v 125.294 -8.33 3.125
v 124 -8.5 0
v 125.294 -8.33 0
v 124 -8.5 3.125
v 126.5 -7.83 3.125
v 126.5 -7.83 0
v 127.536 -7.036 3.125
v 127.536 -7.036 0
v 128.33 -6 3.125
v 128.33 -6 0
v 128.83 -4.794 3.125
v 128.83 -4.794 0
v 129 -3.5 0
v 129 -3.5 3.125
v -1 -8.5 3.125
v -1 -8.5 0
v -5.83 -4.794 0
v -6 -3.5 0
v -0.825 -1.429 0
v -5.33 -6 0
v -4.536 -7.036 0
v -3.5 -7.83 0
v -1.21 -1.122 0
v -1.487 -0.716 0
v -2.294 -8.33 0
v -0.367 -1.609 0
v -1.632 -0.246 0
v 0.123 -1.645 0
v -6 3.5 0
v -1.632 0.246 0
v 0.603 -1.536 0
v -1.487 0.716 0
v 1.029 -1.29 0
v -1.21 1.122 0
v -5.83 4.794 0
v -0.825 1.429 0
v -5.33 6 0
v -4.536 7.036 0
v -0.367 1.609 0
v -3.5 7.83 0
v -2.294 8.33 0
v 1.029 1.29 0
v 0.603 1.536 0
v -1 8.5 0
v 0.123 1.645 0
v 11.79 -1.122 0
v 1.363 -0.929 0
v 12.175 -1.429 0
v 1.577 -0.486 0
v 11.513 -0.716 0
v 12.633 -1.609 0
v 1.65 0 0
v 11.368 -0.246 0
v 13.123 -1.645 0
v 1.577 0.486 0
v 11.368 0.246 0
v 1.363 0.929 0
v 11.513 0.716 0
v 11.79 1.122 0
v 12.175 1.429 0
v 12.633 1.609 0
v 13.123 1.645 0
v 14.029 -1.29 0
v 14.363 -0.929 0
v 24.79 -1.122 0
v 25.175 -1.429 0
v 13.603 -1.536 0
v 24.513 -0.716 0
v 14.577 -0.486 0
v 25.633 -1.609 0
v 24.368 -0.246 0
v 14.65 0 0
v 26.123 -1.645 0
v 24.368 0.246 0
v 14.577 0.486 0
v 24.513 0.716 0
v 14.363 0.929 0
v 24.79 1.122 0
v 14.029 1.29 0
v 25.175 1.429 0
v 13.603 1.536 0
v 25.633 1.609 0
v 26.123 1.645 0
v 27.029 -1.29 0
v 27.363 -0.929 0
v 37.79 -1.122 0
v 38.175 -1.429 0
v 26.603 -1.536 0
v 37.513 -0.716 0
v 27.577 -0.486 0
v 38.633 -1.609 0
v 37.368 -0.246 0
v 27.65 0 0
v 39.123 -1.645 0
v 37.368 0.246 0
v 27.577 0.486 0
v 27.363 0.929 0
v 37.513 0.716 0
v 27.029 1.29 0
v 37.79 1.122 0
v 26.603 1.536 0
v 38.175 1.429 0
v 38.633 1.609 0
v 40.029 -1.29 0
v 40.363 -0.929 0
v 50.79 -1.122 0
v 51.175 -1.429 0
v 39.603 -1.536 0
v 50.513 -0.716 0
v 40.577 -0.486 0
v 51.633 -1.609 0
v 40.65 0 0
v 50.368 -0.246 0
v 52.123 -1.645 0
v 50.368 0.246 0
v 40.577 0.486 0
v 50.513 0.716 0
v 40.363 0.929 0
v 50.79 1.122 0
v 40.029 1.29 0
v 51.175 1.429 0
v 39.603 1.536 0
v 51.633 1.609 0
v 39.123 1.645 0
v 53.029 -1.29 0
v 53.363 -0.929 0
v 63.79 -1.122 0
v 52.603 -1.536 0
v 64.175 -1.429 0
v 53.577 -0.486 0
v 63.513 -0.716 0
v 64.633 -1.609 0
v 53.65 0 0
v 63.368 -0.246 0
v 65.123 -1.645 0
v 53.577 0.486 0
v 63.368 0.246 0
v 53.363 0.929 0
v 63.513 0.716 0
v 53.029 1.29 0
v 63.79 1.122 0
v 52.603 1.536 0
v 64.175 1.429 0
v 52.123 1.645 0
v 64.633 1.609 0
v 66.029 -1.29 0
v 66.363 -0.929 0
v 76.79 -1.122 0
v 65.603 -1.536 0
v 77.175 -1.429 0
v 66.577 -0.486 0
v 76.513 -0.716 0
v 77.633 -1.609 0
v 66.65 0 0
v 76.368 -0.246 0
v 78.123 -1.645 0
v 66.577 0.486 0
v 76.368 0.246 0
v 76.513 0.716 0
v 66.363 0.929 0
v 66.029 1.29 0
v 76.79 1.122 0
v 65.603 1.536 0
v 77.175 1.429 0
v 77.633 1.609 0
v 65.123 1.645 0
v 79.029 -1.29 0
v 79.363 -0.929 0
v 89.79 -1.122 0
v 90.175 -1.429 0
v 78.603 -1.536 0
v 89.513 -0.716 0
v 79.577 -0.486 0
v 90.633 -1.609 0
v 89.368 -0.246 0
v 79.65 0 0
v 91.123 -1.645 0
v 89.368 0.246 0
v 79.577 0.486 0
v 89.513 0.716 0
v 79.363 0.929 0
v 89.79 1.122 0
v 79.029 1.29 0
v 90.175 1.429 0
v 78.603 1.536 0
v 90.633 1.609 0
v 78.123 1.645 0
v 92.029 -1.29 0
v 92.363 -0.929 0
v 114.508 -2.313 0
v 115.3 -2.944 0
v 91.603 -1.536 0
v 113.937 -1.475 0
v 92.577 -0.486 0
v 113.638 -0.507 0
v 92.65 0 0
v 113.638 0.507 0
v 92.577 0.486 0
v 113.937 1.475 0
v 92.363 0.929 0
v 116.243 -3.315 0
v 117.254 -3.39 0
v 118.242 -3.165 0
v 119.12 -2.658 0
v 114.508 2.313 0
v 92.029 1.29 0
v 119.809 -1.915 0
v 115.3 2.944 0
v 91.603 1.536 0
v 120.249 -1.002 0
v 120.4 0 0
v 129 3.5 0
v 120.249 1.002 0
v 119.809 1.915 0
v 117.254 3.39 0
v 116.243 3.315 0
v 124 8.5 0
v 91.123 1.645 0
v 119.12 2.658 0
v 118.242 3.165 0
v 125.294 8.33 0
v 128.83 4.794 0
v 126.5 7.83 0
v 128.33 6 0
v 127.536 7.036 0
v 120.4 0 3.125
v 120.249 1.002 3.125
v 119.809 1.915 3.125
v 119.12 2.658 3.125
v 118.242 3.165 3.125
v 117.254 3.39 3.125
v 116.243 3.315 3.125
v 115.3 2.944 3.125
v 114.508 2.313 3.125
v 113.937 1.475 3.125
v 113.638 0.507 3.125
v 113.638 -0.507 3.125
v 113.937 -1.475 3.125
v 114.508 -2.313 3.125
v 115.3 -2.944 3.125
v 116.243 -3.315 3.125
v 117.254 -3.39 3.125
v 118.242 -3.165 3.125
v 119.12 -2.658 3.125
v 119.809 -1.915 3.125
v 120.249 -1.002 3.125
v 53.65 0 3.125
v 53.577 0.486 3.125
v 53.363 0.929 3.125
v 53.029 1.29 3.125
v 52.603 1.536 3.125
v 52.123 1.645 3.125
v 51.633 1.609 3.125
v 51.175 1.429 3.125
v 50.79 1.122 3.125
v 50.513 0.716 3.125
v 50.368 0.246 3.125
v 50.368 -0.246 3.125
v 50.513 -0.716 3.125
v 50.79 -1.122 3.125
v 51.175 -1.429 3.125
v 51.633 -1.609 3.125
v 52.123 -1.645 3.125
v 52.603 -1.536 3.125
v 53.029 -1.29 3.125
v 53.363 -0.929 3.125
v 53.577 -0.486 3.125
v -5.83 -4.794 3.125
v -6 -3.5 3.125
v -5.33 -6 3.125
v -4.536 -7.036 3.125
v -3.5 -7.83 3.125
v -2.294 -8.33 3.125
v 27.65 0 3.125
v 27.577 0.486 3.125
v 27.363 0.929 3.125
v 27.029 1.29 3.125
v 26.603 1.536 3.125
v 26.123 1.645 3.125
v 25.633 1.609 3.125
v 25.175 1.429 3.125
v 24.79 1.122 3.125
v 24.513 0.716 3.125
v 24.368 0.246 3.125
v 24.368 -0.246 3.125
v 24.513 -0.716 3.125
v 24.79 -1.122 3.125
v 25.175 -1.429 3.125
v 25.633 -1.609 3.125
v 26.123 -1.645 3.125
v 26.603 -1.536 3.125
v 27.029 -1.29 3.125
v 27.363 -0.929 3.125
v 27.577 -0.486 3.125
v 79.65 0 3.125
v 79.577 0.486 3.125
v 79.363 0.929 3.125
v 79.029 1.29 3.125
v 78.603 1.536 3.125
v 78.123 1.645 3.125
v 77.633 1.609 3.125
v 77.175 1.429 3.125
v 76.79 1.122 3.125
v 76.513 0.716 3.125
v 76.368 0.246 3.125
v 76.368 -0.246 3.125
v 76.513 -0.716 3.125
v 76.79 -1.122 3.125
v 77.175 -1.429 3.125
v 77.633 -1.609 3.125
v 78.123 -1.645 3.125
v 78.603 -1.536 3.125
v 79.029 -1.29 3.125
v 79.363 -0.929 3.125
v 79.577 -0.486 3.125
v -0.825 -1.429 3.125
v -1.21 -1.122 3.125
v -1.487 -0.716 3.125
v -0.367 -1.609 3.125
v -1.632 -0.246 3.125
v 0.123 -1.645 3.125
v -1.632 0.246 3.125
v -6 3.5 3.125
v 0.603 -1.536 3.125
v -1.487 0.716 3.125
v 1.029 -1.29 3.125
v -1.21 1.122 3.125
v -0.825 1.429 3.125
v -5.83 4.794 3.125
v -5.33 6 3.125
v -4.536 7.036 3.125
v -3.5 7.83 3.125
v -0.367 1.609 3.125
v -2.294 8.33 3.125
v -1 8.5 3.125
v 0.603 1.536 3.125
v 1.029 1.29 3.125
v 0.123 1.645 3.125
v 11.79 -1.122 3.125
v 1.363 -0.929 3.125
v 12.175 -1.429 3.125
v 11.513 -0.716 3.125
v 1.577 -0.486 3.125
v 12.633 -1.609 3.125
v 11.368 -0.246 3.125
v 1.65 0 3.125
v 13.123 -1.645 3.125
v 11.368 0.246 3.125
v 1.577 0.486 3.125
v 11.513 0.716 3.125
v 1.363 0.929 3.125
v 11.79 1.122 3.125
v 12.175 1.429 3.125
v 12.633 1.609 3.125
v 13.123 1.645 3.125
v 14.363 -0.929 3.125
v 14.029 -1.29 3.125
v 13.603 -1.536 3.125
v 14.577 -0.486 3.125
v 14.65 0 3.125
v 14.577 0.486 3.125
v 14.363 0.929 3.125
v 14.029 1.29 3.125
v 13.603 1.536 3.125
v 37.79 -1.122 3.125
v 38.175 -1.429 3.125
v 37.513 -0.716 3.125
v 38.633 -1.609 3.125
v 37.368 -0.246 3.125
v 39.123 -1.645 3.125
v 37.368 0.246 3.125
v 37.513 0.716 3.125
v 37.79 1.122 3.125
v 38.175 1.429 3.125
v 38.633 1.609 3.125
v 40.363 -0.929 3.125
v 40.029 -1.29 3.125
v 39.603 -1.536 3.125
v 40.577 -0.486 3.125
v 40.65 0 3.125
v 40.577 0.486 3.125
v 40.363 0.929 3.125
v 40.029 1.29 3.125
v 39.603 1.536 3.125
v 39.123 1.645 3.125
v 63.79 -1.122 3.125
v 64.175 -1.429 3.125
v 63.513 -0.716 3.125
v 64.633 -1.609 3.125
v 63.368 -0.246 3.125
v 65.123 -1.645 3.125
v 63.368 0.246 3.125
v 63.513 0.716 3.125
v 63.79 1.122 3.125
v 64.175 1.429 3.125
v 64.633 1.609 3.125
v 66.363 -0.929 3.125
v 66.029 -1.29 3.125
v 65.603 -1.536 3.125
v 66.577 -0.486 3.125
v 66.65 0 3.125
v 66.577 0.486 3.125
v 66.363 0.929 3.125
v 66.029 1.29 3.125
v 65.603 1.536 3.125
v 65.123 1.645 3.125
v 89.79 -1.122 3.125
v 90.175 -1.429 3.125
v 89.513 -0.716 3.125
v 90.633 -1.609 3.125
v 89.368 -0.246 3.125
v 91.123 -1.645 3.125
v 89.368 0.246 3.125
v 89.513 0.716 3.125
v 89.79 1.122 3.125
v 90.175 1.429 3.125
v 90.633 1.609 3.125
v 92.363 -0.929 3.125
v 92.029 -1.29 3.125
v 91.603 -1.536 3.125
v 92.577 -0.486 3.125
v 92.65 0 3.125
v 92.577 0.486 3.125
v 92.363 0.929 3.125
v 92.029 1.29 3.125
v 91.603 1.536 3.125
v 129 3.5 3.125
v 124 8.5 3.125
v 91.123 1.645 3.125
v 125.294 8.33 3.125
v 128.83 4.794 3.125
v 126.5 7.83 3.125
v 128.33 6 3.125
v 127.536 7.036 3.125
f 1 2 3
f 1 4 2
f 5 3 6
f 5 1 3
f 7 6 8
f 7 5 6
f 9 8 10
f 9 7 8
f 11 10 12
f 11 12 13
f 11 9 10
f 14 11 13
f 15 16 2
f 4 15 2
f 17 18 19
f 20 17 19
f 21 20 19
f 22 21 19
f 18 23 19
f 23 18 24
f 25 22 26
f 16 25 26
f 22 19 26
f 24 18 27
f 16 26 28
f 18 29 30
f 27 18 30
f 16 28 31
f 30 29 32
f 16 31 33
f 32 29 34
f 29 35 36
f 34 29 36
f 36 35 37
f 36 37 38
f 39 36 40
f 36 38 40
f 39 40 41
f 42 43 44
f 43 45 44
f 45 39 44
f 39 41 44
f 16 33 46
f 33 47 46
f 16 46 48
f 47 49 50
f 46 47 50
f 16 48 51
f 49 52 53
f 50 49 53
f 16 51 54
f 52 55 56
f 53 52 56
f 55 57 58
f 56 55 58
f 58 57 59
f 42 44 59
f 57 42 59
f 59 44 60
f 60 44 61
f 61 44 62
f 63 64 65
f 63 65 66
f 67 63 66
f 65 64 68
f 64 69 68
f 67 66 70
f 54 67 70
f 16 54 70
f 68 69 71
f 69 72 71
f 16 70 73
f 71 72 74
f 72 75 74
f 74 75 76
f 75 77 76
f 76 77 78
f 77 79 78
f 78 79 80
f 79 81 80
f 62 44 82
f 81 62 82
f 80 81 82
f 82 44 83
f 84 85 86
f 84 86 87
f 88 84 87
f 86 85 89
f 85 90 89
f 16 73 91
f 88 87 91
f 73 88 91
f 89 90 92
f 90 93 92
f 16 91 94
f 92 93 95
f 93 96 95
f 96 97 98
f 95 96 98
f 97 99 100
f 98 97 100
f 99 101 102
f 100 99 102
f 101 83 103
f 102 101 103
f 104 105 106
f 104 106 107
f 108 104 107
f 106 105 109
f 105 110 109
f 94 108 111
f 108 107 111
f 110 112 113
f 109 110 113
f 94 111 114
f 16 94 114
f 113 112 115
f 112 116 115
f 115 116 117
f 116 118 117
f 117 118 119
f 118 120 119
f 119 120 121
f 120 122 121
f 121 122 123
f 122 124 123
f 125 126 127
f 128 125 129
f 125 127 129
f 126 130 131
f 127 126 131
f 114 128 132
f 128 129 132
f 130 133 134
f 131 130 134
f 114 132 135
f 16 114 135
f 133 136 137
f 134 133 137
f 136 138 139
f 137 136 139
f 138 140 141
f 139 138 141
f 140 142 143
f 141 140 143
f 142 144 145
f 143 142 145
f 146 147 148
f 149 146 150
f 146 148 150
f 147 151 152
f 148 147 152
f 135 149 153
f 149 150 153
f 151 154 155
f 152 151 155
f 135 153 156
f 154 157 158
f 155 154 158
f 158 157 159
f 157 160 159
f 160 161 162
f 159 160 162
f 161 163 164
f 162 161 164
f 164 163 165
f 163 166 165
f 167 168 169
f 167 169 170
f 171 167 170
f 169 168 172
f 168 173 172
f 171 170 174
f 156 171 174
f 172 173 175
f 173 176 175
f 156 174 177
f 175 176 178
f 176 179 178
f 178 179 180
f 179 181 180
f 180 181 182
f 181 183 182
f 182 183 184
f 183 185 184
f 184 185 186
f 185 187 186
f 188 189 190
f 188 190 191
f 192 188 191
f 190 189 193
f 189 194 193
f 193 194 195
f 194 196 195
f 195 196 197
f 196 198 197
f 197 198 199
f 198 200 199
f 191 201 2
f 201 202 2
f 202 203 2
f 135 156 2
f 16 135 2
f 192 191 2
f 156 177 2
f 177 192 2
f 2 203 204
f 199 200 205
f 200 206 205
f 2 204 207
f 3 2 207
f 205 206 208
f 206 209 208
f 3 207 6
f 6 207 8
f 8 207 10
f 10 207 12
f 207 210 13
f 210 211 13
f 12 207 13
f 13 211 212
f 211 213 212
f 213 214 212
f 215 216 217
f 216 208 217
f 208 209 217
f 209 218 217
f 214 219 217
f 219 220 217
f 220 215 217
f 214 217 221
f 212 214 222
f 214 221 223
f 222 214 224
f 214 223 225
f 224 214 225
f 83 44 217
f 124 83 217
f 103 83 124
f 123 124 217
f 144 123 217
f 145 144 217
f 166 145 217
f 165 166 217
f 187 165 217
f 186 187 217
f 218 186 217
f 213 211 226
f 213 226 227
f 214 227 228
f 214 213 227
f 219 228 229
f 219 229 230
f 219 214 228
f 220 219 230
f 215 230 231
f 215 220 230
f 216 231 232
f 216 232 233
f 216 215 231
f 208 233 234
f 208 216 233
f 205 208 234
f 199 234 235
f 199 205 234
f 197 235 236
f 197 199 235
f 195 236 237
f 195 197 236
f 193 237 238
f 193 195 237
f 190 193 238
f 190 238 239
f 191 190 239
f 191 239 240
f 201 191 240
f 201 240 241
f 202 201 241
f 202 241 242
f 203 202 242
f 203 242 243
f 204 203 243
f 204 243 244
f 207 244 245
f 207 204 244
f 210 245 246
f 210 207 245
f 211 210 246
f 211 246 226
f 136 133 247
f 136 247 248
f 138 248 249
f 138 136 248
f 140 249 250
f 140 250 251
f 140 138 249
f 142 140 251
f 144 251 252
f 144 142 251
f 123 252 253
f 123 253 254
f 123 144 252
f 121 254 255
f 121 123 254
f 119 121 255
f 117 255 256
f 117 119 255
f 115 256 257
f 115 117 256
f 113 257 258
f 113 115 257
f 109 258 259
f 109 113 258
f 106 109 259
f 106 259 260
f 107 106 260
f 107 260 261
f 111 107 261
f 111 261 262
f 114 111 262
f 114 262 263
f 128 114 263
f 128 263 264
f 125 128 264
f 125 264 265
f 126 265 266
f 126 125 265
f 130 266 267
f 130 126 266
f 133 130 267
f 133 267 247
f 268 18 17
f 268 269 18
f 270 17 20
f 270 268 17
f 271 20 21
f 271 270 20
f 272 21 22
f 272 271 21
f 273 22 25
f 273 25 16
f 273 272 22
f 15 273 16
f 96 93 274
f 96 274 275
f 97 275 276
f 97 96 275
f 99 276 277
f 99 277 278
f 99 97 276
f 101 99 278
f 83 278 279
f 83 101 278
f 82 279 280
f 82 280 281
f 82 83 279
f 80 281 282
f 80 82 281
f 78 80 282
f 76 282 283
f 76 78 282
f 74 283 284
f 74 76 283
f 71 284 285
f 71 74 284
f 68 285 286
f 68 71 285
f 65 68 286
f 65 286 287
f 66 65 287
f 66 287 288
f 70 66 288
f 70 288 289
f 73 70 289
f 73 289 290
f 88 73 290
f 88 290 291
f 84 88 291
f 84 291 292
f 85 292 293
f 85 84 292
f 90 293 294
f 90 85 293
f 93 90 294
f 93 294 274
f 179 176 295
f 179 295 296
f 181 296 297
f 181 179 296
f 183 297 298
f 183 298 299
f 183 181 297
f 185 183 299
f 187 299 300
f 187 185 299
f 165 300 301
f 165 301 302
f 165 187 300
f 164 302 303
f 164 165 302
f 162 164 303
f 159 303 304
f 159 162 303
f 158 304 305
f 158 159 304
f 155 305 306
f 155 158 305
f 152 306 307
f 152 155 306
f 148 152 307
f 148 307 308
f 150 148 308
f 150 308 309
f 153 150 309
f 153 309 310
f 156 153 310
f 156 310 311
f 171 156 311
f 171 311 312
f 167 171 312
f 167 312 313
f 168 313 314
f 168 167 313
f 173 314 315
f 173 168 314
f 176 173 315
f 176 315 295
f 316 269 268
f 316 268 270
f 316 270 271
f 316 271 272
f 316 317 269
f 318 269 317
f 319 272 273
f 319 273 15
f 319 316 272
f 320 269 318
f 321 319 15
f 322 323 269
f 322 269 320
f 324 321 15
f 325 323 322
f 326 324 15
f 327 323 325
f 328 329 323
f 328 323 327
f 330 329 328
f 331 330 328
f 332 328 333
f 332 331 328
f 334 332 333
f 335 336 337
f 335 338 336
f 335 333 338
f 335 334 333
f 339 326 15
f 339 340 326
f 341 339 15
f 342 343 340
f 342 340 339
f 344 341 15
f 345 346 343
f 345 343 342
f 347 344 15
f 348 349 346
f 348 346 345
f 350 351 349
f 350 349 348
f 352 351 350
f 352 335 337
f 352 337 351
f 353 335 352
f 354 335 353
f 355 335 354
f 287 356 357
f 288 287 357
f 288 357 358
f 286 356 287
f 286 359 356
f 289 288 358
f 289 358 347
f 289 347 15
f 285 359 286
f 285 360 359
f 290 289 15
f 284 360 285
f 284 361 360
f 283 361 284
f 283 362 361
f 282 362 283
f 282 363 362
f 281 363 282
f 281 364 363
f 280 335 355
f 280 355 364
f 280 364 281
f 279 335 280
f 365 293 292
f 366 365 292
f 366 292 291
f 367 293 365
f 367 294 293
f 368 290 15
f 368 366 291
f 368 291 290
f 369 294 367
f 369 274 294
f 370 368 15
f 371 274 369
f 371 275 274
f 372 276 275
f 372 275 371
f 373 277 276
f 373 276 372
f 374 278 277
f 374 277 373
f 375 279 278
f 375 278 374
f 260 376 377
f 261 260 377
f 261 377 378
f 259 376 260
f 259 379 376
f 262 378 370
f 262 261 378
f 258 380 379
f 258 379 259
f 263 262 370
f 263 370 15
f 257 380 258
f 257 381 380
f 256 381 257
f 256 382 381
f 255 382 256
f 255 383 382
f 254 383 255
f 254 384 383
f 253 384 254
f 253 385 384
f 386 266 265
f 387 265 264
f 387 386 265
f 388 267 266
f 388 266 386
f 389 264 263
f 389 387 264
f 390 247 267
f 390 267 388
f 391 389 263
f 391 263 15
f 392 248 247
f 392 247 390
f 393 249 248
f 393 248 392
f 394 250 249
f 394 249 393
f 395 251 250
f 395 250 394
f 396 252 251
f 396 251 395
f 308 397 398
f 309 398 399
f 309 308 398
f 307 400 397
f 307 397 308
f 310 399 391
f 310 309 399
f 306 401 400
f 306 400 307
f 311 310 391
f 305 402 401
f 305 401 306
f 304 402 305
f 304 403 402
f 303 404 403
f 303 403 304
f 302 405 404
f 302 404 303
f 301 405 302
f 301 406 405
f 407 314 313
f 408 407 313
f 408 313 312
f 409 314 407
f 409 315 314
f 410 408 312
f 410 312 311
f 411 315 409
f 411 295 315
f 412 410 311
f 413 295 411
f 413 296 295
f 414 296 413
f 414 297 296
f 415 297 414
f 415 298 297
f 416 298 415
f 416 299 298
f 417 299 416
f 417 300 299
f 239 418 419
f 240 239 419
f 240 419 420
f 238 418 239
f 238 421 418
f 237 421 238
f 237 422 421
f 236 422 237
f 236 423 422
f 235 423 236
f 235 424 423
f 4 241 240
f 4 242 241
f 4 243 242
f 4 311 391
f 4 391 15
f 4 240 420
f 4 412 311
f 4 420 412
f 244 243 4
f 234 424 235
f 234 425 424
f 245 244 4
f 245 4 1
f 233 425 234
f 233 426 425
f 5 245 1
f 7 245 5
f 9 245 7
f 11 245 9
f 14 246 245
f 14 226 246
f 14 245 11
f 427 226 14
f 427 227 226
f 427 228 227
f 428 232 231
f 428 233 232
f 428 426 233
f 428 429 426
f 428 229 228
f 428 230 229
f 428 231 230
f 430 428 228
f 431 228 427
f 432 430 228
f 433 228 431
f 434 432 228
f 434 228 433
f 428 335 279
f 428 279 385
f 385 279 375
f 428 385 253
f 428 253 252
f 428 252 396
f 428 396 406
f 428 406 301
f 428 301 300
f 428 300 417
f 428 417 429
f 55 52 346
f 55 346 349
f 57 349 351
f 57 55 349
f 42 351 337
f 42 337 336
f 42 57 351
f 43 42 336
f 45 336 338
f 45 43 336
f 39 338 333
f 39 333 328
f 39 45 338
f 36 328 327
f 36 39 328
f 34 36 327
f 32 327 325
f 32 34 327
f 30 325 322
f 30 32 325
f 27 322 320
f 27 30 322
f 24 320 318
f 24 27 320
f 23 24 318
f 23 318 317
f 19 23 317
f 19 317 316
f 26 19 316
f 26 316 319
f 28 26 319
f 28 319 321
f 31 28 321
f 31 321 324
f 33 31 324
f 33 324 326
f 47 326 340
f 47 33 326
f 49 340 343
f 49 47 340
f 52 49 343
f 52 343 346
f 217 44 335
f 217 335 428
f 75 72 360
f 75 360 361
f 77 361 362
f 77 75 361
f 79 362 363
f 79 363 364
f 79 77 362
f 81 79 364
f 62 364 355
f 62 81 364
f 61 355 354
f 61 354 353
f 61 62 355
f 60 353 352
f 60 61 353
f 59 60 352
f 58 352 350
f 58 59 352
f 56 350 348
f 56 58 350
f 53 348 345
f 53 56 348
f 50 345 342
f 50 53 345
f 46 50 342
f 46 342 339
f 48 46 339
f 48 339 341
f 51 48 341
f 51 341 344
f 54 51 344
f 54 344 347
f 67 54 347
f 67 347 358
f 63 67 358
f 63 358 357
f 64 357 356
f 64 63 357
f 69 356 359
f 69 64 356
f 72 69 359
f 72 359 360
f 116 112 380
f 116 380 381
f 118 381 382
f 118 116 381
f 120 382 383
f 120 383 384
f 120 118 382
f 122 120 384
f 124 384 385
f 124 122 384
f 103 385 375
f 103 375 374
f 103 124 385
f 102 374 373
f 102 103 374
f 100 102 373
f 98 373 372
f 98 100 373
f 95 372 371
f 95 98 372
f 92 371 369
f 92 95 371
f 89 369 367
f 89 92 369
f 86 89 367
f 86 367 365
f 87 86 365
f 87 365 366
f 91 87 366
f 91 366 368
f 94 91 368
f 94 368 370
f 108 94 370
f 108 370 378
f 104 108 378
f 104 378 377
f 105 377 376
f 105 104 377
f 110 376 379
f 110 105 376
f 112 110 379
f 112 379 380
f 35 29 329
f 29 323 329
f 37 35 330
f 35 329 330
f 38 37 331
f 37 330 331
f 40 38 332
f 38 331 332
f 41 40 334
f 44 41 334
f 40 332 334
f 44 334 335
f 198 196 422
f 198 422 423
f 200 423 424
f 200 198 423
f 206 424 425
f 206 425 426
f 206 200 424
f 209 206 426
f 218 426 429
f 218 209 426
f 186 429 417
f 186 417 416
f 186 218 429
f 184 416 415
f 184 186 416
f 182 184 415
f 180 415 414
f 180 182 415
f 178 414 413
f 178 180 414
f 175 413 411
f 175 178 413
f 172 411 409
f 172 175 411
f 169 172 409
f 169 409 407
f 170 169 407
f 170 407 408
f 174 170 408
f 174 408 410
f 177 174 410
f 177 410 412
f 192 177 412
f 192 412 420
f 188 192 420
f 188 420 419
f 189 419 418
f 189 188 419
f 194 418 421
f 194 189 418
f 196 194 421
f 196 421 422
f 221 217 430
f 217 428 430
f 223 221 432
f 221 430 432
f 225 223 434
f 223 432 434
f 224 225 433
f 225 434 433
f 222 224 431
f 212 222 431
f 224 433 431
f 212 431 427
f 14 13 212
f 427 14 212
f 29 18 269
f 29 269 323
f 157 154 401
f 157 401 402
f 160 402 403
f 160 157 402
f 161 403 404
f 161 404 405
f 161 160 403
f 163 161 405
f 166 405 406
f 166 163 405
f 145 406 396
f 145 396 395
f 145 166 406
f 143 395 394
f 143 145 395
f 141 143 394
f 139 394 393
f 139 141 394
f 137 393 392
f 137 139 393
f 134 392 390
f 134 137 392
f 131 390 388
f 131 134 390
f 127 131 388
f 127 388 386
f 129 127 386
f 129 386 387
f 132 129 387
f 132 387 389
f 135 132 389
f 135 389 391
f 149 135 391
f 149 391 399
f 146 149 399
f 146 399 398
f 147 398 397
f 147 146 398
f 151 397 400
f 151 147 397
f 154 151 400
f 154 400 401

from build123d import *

# Parameters (mm, degrees)
SKETCH_W   = 135
SKETCH_H   = 17
SKETCH_R   = 1.65
SKETCH_R_2 = 3.4
PAD_DEPTH  = 3.125
FILLET_R   = 5


with BuildPart() as part:
    # Sketch → Pad (new body)
    with BuildSketch(Plane.XY):
        with Locations((61.5, 0)):
            Rectangle(SKETCH_W, SKETCH_H)
        Circle(SKETCH_R, mode=Mode.SUBTRACT)
        with Locations((13, 0)):
            Circle(SKETCH_R, mode=Mode.SUBTRACT)
        with Locations((26, 0)):
            Circle(SKETCH_R, mode=Mode.SUBTRACT)
        with Locations((39, 0)):
            Circle(SKETCH_R, mode=Mode.SUBTRACT)
        with Locations((52, 0)):
            Circle(SKETCH_R, mode=Mode.SUBTRACT)
        with Locations((65, 0)):
            Circle(SKETCH_R, mode=Mode.SUBTRACT)
        with Locations((91, 0)):
            Circle(SKETCH_R, mode=Mode.SUBTRACT)
        with Locations((78, 0)):
            Circle(SKETCH_R, mode=Mode.SUBTRACT)
        with Locations((117, 0)):
            Circle(SKETCH_R_2, mode=Mode.SUBTRACT)
    extrude(amount=PAD_DEPTH)

    # Fillet
    fillet_edges = [part.edges().sort_by_distance(p)[0] for p in [
        (-6, -8.5, 1.5625),
        (129, -8.5, 1.5625),
        (129, 8.5, 1.5625),
        (-6, 8.5, 1.5625),
    ]]
    fillet(fillet_edges, radius=FILLET_R)


solid = part.part
